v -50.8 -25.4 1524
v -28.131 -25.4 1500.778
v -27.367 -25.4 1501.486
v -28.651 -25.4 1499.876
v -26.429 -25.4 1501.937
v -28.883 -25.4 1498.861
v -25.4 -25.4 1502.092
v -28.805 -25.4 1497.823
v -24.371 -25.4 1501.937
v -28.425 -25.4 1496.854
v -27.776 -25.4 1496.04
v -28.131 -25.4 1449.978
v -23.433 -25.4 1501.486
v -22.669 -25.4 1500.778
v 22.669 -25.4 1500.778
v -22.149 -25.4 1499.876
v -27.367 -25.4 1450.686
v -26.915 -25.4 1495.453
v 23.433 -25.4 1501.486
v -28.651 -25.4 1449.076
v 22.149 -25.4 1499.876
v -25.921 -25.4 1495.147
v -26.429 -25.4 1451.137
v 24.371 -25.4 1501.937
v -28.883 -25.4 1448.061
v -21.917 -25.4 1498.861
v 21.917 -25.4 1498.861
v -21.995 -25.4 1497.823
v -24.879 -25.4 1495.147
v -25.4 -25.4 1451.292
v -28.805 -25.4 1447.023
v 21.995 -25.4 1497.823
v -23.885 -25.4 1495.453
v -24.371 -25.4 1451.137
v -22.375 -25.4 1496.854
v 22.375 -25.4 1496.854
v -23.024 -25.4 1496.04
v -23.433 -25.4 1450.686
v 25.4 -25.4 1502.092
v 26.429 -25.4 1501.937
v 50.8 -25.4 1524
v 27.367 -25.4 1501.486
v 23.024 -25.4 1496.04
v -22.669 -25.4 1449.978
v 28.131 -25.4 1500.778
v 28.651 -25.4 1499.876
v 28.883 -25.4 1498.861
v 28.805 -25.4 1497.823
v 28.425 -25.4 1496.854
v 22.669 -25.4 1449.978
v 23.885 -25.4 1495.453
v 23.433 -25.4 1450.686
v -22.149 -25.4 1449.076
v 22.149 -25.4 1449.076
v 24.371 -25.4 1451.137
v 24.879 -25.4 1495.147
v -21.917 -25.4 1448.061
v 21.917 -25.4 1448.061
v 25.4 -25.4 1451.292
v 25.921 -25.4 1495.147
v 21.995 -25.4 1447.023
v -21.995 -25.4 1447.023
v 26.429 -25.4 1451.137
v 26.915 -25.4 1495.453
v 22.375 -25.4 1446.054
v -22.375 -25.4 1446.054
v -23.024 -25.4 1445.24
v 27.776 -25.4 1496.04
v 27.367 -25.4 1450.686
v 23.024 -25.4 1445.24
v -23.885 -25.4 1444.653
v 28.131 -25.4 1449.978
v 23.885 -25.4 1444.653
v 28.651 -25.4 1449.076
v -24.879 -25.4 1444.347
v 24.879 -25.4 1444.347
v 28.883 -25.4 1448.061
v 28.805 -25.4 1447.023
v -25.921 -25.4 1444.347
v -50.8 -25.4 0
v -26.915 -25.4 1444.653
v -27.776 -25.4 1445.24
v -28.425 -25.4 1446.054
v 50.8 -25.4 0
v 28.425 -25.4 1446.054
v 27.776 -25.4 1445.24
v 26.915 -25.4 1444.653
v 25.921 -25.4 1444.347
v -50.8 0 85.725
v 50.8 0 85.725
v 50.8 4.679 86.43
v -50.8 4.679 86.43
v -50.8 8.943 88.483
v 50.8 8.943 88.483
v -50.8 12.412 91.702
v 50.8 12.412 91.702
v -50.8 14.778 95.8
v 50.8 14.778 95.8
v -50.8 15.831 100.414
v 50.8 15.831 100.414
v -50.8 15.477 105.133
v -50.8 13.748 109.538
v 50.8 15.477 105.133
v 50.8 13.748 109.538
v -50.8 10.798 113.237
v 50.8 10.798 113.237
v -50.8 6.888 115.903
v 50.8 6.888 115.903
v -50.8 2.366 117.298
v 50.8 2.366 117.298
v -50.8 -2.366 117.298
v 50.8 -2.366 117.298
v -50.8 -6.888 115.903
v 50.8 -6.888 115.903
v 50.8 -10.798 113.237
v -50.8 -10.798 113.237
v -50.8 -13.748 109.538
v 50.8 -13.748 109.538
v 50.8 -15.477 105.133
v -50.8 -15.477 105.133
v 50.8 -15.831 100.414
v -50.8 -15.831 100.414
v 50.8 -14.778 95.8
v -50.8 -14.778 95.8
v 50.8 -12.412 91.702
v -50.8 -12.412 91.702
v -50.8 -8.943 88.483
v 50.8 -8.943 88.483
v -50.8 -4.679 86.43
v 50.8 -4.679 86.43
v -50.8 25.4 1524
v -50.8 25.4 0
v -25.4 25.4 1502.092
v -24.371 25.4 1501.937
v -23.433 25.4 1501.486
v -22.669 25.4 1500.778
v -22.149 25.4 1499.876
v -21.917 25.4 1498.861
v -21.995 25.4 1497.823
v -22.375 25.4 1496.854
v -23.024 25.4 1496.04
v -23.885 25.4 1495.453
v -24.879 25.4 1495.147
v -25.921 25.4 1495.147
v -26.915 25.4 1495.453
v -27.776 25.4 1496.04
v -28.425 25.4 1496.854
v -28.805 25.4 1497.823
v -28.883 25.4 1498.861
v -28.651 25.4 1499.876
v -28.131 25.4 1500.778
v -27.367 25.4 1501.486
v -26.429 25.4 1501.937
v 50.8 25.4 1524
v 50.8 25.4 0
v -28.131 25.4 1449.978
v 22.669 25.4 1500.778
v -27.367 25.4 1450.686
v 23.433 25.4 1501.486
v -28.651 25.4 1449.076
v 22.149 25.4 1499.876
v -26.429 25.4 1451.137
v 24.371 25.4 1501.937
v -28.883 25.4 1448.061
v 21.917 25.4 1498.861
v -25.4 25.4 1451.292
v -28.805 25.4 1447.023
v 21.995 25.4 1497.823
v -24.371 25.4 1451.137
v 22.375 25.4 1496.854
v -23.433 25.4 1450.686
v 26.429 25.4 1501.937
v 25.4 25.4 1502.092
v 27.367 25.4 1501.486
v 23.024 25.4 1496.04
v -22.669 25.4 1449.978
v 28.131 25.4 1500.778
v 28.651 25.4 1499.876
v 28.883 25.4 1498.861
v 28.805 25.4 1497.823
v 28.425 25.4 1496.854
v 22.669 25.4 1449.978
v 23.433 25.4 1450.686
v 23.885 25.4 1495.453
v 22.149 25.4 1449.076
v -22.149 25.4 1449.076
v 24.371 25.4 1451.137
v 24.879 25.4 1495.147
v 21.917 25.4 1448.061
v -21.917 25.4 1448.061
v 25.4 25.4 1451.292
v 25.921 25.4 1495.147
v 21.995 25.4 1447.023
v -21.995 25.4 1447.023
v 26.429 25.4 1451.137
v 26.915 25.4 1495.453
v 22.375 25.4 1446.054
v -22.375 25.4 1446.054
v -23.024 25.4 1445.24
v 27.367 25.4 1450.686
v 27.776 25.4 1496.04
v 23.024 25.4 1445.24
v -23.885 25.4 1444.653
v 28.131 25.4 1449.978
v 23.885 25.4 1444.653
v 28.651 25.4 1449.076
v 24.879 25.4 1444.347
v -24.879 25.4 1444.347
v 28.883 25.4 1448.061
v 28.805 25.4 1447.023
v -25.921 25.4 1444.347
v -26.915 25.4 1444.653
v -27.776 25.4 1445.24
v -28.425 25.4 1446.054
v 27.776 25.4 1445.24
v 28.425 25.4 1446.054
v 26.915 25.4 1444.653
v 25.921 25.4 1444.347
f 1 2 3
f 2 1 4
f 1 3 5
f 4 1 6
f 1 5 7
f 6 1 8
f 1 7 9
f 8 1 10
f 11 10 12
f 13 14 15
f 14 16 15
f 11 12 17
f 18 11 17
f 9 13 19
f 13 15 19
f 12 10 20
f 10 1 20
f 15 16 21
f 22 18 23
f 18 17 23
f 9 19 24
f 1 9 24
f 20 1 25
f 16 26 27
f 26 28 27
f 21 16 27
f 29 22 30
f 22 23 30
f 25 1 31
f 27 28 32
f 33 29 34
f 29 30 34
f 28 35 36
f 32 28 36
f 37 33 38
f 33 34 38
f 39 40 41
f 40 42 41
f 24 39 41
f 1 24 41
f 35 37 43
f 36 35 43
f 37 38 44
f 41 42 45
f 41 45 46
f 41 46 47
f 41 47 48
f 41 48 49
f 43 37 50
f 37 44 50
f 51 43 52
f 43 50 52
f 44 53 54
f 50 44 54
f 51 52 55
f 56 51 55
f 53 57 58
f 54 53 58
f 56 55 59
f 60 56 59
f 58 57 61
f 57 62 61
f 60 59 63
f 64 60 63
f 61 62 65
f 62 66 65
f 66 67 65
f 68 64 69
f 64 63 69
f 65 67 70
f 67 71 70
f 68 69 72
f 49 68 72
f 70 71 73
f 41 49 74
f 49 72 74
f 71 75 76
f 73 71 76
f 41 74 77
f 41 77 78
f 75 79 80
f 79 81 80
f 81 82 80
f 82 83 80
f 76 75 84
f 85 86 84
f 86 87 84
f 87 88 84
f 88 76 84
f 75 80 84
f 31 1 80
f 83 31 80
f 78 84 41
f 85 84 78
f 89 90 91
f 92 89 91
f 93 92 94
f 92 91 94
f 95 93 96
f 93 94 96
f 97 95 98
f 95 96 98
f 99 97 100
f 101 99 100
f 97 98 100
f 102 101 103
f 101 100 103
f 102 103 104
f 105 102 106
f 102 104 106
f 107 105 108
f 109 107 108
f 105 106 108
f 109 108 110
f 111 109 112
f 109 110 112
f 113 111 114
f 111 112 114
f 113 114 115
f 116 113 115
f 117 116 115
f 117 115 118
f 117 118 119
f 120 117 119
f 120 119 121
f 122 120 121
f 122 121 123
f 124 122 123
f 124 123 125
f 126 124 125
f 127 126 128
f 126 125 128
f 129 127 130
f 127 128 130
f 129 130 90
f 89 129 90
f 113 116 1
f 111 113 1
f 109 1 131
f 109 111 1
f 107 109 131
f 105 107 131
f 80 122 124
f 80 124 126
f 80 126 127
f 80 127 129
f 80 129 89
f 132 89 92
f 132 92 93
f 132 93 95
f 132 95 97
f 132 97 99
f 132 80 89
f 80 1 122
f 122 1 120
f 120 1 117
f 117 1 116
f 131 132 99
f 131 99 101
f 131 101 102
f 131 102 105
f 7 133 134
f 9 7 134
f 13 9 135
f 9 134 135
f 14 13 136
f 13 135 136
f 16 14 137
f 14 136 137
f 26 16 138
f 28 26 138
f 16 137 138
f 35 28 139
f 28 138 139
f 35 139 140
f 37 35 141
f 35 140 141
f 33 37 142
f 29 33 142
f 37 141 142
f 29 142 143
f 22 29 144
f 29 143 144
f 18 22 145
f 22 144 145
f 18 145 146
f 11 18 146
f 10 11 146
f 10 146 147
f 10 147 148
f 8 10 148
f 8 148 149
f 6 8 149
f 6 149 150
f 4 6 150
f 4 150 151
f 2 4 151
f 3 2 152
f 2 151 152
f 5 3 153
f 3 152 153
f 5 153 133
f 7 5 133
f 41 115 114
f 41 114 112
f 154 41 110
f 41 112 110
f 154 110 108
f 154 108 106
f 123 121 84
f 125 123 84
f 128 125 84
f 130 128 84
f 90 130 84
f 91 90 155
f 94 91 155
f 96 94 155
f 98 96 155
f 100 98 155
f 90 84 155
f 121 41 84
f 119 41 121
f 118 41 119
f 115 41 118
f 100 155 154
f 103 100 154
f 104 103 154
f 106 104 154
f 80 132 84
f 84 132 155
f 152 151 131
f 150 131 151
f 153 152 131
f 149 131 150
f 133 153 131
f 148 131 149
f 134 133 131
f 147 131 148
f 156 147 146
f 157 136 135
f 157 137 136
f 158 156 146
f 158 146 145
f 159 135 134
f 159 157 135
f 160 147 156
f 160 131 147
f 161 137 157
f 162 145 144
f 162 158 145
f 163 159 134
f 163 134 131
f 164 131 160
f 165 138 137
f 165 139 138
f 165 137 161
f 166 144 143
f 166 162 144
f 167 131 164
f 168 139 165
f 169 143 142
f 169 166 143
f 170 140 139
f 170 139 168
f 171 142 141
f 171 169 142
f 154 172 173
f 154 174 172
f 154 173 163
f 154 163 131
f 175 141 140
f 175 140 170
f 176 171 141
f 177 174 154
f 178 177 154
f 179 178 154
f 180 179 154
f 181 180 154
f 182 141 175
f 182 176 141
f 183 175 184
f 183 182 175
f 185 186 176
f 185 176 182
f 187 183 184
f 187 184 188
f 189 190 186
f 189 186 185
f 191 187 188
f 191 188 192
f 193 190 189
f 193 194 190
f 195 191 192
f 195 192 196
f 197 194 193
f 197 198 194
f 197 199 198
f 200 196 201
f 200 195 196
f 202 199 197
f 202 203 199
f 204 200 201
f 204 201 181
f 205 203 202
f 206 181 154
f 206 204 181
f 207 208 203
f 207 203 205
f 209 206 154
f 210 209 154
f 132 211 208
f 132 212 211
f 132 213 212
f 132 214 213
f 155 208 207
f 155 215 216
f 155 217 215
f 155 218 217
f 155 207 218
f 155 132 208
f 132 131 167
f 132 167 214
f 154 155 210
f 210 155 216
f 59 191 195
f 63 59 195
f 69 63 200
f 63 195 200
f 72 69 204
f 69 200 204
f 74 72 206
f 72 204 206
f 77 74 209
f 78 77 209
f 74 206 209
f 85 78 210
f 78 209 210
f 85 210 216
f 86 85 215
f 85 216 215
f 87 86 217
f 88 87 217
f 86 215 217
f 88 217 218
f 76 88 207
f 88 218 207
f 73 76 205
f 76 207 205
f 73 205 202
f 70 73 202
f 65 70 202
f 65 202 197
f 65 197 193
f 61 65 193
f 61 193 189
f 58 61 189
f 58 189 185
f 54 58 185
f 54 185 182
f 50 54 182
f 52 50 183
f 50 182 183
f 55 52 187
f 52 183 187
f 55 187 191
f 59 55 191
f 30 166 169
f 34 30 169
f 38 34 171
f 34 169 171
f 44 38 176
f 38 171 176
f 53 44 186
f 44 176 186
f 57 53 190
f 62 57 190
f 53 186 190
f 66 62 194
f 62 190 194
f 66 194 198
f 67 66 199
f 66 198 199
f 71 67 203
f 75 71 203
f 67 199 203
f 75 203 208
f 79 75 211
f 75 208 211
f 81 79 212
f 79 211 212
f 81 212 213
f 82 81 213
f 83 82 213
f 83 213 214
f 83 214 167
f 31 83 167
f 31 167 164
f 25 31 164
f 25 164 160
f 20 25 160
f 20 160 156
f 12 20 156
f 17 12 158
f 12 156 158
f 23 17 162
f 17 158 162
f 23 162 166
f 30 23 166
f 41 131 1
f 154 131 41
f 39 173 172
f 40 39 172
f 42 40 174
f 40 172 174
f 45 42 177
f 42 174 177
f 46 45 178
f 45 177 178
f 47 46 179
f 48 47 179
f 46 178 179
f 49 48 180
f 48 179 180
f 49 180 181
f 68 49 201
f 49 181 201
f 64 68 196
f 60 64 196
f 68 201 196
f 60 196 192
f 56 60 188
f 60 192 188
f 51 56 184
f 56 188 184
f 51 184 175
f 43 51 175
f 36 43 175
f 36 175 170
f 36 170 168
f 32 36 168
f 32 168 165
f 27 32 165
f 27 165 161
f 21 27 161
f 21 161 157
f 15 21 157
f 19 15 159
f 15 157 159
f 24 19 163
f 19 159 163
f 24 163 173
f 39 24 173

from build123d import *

# Parameters (mm, degrees)
SKETCH1_W           = 101.6
SKETCH1_H           = 50.8
BOSS_EXTRUDE1_DEPTH = 1524
SKETCH2_R           = 3.4925
CUT_EXTRUDE1_DEPTH  = 50.8
SKETCH3_R           = 15.875
CUT_EXTRUDE2_DEPTH  = 101.6


with BuildPart() as part:
    # Sketch1 → Boss-Extrude1 (new body)
    with BuildSketch(Plane.XY):
        Rectangle(SKETCH1_W, SKETCH1_H)
    extrude(amount=BOSS_EXTRUDE1_DEPTH)

    # Sketch2 → Cut-Extrude1 (cut)
    with BuildSketch(Plane(origin=(0, 25.4, 0), x_dir=(1, 0, 0), z_dir=(0, 1, 0))):
        with Locations(Location((-25.4, -1447.8, 0), (0, 0, 270))):
            Circle(SKETCH2_R)
        with Locations(Location((25.4, -1447.8, 0), (0, 0, 270))):
            Circle(SKETCH2_R)
        with Locations(Location((25.4, -1498.6, 0), (0, 0, 270))):
            Circle(SKETCH2_R)
        with Locations(Location((-25.4, -1498.6, 0), (0, 0, 270))):
            Circle(SKETCH2_R)
    extrude(amount=-CUT_EXTRUDE1_DEPTH, mode=Mode.SUBTRACT)

    # Sketch3 → Cut-Extrude2 (cut)
    with BuildSketch(Plane(origin=(50.8, 0, 0), x_dir=(0, 0, -1), z_dir=(1, 0, 0))):
        with Locations((-101.6, 0)):
            Circle(SKETCH3_R)
    extrude(amount=-CUT_EXTRUDE2_DEPTH, mode=Mode.SUBTRACT)


solid = part.part
